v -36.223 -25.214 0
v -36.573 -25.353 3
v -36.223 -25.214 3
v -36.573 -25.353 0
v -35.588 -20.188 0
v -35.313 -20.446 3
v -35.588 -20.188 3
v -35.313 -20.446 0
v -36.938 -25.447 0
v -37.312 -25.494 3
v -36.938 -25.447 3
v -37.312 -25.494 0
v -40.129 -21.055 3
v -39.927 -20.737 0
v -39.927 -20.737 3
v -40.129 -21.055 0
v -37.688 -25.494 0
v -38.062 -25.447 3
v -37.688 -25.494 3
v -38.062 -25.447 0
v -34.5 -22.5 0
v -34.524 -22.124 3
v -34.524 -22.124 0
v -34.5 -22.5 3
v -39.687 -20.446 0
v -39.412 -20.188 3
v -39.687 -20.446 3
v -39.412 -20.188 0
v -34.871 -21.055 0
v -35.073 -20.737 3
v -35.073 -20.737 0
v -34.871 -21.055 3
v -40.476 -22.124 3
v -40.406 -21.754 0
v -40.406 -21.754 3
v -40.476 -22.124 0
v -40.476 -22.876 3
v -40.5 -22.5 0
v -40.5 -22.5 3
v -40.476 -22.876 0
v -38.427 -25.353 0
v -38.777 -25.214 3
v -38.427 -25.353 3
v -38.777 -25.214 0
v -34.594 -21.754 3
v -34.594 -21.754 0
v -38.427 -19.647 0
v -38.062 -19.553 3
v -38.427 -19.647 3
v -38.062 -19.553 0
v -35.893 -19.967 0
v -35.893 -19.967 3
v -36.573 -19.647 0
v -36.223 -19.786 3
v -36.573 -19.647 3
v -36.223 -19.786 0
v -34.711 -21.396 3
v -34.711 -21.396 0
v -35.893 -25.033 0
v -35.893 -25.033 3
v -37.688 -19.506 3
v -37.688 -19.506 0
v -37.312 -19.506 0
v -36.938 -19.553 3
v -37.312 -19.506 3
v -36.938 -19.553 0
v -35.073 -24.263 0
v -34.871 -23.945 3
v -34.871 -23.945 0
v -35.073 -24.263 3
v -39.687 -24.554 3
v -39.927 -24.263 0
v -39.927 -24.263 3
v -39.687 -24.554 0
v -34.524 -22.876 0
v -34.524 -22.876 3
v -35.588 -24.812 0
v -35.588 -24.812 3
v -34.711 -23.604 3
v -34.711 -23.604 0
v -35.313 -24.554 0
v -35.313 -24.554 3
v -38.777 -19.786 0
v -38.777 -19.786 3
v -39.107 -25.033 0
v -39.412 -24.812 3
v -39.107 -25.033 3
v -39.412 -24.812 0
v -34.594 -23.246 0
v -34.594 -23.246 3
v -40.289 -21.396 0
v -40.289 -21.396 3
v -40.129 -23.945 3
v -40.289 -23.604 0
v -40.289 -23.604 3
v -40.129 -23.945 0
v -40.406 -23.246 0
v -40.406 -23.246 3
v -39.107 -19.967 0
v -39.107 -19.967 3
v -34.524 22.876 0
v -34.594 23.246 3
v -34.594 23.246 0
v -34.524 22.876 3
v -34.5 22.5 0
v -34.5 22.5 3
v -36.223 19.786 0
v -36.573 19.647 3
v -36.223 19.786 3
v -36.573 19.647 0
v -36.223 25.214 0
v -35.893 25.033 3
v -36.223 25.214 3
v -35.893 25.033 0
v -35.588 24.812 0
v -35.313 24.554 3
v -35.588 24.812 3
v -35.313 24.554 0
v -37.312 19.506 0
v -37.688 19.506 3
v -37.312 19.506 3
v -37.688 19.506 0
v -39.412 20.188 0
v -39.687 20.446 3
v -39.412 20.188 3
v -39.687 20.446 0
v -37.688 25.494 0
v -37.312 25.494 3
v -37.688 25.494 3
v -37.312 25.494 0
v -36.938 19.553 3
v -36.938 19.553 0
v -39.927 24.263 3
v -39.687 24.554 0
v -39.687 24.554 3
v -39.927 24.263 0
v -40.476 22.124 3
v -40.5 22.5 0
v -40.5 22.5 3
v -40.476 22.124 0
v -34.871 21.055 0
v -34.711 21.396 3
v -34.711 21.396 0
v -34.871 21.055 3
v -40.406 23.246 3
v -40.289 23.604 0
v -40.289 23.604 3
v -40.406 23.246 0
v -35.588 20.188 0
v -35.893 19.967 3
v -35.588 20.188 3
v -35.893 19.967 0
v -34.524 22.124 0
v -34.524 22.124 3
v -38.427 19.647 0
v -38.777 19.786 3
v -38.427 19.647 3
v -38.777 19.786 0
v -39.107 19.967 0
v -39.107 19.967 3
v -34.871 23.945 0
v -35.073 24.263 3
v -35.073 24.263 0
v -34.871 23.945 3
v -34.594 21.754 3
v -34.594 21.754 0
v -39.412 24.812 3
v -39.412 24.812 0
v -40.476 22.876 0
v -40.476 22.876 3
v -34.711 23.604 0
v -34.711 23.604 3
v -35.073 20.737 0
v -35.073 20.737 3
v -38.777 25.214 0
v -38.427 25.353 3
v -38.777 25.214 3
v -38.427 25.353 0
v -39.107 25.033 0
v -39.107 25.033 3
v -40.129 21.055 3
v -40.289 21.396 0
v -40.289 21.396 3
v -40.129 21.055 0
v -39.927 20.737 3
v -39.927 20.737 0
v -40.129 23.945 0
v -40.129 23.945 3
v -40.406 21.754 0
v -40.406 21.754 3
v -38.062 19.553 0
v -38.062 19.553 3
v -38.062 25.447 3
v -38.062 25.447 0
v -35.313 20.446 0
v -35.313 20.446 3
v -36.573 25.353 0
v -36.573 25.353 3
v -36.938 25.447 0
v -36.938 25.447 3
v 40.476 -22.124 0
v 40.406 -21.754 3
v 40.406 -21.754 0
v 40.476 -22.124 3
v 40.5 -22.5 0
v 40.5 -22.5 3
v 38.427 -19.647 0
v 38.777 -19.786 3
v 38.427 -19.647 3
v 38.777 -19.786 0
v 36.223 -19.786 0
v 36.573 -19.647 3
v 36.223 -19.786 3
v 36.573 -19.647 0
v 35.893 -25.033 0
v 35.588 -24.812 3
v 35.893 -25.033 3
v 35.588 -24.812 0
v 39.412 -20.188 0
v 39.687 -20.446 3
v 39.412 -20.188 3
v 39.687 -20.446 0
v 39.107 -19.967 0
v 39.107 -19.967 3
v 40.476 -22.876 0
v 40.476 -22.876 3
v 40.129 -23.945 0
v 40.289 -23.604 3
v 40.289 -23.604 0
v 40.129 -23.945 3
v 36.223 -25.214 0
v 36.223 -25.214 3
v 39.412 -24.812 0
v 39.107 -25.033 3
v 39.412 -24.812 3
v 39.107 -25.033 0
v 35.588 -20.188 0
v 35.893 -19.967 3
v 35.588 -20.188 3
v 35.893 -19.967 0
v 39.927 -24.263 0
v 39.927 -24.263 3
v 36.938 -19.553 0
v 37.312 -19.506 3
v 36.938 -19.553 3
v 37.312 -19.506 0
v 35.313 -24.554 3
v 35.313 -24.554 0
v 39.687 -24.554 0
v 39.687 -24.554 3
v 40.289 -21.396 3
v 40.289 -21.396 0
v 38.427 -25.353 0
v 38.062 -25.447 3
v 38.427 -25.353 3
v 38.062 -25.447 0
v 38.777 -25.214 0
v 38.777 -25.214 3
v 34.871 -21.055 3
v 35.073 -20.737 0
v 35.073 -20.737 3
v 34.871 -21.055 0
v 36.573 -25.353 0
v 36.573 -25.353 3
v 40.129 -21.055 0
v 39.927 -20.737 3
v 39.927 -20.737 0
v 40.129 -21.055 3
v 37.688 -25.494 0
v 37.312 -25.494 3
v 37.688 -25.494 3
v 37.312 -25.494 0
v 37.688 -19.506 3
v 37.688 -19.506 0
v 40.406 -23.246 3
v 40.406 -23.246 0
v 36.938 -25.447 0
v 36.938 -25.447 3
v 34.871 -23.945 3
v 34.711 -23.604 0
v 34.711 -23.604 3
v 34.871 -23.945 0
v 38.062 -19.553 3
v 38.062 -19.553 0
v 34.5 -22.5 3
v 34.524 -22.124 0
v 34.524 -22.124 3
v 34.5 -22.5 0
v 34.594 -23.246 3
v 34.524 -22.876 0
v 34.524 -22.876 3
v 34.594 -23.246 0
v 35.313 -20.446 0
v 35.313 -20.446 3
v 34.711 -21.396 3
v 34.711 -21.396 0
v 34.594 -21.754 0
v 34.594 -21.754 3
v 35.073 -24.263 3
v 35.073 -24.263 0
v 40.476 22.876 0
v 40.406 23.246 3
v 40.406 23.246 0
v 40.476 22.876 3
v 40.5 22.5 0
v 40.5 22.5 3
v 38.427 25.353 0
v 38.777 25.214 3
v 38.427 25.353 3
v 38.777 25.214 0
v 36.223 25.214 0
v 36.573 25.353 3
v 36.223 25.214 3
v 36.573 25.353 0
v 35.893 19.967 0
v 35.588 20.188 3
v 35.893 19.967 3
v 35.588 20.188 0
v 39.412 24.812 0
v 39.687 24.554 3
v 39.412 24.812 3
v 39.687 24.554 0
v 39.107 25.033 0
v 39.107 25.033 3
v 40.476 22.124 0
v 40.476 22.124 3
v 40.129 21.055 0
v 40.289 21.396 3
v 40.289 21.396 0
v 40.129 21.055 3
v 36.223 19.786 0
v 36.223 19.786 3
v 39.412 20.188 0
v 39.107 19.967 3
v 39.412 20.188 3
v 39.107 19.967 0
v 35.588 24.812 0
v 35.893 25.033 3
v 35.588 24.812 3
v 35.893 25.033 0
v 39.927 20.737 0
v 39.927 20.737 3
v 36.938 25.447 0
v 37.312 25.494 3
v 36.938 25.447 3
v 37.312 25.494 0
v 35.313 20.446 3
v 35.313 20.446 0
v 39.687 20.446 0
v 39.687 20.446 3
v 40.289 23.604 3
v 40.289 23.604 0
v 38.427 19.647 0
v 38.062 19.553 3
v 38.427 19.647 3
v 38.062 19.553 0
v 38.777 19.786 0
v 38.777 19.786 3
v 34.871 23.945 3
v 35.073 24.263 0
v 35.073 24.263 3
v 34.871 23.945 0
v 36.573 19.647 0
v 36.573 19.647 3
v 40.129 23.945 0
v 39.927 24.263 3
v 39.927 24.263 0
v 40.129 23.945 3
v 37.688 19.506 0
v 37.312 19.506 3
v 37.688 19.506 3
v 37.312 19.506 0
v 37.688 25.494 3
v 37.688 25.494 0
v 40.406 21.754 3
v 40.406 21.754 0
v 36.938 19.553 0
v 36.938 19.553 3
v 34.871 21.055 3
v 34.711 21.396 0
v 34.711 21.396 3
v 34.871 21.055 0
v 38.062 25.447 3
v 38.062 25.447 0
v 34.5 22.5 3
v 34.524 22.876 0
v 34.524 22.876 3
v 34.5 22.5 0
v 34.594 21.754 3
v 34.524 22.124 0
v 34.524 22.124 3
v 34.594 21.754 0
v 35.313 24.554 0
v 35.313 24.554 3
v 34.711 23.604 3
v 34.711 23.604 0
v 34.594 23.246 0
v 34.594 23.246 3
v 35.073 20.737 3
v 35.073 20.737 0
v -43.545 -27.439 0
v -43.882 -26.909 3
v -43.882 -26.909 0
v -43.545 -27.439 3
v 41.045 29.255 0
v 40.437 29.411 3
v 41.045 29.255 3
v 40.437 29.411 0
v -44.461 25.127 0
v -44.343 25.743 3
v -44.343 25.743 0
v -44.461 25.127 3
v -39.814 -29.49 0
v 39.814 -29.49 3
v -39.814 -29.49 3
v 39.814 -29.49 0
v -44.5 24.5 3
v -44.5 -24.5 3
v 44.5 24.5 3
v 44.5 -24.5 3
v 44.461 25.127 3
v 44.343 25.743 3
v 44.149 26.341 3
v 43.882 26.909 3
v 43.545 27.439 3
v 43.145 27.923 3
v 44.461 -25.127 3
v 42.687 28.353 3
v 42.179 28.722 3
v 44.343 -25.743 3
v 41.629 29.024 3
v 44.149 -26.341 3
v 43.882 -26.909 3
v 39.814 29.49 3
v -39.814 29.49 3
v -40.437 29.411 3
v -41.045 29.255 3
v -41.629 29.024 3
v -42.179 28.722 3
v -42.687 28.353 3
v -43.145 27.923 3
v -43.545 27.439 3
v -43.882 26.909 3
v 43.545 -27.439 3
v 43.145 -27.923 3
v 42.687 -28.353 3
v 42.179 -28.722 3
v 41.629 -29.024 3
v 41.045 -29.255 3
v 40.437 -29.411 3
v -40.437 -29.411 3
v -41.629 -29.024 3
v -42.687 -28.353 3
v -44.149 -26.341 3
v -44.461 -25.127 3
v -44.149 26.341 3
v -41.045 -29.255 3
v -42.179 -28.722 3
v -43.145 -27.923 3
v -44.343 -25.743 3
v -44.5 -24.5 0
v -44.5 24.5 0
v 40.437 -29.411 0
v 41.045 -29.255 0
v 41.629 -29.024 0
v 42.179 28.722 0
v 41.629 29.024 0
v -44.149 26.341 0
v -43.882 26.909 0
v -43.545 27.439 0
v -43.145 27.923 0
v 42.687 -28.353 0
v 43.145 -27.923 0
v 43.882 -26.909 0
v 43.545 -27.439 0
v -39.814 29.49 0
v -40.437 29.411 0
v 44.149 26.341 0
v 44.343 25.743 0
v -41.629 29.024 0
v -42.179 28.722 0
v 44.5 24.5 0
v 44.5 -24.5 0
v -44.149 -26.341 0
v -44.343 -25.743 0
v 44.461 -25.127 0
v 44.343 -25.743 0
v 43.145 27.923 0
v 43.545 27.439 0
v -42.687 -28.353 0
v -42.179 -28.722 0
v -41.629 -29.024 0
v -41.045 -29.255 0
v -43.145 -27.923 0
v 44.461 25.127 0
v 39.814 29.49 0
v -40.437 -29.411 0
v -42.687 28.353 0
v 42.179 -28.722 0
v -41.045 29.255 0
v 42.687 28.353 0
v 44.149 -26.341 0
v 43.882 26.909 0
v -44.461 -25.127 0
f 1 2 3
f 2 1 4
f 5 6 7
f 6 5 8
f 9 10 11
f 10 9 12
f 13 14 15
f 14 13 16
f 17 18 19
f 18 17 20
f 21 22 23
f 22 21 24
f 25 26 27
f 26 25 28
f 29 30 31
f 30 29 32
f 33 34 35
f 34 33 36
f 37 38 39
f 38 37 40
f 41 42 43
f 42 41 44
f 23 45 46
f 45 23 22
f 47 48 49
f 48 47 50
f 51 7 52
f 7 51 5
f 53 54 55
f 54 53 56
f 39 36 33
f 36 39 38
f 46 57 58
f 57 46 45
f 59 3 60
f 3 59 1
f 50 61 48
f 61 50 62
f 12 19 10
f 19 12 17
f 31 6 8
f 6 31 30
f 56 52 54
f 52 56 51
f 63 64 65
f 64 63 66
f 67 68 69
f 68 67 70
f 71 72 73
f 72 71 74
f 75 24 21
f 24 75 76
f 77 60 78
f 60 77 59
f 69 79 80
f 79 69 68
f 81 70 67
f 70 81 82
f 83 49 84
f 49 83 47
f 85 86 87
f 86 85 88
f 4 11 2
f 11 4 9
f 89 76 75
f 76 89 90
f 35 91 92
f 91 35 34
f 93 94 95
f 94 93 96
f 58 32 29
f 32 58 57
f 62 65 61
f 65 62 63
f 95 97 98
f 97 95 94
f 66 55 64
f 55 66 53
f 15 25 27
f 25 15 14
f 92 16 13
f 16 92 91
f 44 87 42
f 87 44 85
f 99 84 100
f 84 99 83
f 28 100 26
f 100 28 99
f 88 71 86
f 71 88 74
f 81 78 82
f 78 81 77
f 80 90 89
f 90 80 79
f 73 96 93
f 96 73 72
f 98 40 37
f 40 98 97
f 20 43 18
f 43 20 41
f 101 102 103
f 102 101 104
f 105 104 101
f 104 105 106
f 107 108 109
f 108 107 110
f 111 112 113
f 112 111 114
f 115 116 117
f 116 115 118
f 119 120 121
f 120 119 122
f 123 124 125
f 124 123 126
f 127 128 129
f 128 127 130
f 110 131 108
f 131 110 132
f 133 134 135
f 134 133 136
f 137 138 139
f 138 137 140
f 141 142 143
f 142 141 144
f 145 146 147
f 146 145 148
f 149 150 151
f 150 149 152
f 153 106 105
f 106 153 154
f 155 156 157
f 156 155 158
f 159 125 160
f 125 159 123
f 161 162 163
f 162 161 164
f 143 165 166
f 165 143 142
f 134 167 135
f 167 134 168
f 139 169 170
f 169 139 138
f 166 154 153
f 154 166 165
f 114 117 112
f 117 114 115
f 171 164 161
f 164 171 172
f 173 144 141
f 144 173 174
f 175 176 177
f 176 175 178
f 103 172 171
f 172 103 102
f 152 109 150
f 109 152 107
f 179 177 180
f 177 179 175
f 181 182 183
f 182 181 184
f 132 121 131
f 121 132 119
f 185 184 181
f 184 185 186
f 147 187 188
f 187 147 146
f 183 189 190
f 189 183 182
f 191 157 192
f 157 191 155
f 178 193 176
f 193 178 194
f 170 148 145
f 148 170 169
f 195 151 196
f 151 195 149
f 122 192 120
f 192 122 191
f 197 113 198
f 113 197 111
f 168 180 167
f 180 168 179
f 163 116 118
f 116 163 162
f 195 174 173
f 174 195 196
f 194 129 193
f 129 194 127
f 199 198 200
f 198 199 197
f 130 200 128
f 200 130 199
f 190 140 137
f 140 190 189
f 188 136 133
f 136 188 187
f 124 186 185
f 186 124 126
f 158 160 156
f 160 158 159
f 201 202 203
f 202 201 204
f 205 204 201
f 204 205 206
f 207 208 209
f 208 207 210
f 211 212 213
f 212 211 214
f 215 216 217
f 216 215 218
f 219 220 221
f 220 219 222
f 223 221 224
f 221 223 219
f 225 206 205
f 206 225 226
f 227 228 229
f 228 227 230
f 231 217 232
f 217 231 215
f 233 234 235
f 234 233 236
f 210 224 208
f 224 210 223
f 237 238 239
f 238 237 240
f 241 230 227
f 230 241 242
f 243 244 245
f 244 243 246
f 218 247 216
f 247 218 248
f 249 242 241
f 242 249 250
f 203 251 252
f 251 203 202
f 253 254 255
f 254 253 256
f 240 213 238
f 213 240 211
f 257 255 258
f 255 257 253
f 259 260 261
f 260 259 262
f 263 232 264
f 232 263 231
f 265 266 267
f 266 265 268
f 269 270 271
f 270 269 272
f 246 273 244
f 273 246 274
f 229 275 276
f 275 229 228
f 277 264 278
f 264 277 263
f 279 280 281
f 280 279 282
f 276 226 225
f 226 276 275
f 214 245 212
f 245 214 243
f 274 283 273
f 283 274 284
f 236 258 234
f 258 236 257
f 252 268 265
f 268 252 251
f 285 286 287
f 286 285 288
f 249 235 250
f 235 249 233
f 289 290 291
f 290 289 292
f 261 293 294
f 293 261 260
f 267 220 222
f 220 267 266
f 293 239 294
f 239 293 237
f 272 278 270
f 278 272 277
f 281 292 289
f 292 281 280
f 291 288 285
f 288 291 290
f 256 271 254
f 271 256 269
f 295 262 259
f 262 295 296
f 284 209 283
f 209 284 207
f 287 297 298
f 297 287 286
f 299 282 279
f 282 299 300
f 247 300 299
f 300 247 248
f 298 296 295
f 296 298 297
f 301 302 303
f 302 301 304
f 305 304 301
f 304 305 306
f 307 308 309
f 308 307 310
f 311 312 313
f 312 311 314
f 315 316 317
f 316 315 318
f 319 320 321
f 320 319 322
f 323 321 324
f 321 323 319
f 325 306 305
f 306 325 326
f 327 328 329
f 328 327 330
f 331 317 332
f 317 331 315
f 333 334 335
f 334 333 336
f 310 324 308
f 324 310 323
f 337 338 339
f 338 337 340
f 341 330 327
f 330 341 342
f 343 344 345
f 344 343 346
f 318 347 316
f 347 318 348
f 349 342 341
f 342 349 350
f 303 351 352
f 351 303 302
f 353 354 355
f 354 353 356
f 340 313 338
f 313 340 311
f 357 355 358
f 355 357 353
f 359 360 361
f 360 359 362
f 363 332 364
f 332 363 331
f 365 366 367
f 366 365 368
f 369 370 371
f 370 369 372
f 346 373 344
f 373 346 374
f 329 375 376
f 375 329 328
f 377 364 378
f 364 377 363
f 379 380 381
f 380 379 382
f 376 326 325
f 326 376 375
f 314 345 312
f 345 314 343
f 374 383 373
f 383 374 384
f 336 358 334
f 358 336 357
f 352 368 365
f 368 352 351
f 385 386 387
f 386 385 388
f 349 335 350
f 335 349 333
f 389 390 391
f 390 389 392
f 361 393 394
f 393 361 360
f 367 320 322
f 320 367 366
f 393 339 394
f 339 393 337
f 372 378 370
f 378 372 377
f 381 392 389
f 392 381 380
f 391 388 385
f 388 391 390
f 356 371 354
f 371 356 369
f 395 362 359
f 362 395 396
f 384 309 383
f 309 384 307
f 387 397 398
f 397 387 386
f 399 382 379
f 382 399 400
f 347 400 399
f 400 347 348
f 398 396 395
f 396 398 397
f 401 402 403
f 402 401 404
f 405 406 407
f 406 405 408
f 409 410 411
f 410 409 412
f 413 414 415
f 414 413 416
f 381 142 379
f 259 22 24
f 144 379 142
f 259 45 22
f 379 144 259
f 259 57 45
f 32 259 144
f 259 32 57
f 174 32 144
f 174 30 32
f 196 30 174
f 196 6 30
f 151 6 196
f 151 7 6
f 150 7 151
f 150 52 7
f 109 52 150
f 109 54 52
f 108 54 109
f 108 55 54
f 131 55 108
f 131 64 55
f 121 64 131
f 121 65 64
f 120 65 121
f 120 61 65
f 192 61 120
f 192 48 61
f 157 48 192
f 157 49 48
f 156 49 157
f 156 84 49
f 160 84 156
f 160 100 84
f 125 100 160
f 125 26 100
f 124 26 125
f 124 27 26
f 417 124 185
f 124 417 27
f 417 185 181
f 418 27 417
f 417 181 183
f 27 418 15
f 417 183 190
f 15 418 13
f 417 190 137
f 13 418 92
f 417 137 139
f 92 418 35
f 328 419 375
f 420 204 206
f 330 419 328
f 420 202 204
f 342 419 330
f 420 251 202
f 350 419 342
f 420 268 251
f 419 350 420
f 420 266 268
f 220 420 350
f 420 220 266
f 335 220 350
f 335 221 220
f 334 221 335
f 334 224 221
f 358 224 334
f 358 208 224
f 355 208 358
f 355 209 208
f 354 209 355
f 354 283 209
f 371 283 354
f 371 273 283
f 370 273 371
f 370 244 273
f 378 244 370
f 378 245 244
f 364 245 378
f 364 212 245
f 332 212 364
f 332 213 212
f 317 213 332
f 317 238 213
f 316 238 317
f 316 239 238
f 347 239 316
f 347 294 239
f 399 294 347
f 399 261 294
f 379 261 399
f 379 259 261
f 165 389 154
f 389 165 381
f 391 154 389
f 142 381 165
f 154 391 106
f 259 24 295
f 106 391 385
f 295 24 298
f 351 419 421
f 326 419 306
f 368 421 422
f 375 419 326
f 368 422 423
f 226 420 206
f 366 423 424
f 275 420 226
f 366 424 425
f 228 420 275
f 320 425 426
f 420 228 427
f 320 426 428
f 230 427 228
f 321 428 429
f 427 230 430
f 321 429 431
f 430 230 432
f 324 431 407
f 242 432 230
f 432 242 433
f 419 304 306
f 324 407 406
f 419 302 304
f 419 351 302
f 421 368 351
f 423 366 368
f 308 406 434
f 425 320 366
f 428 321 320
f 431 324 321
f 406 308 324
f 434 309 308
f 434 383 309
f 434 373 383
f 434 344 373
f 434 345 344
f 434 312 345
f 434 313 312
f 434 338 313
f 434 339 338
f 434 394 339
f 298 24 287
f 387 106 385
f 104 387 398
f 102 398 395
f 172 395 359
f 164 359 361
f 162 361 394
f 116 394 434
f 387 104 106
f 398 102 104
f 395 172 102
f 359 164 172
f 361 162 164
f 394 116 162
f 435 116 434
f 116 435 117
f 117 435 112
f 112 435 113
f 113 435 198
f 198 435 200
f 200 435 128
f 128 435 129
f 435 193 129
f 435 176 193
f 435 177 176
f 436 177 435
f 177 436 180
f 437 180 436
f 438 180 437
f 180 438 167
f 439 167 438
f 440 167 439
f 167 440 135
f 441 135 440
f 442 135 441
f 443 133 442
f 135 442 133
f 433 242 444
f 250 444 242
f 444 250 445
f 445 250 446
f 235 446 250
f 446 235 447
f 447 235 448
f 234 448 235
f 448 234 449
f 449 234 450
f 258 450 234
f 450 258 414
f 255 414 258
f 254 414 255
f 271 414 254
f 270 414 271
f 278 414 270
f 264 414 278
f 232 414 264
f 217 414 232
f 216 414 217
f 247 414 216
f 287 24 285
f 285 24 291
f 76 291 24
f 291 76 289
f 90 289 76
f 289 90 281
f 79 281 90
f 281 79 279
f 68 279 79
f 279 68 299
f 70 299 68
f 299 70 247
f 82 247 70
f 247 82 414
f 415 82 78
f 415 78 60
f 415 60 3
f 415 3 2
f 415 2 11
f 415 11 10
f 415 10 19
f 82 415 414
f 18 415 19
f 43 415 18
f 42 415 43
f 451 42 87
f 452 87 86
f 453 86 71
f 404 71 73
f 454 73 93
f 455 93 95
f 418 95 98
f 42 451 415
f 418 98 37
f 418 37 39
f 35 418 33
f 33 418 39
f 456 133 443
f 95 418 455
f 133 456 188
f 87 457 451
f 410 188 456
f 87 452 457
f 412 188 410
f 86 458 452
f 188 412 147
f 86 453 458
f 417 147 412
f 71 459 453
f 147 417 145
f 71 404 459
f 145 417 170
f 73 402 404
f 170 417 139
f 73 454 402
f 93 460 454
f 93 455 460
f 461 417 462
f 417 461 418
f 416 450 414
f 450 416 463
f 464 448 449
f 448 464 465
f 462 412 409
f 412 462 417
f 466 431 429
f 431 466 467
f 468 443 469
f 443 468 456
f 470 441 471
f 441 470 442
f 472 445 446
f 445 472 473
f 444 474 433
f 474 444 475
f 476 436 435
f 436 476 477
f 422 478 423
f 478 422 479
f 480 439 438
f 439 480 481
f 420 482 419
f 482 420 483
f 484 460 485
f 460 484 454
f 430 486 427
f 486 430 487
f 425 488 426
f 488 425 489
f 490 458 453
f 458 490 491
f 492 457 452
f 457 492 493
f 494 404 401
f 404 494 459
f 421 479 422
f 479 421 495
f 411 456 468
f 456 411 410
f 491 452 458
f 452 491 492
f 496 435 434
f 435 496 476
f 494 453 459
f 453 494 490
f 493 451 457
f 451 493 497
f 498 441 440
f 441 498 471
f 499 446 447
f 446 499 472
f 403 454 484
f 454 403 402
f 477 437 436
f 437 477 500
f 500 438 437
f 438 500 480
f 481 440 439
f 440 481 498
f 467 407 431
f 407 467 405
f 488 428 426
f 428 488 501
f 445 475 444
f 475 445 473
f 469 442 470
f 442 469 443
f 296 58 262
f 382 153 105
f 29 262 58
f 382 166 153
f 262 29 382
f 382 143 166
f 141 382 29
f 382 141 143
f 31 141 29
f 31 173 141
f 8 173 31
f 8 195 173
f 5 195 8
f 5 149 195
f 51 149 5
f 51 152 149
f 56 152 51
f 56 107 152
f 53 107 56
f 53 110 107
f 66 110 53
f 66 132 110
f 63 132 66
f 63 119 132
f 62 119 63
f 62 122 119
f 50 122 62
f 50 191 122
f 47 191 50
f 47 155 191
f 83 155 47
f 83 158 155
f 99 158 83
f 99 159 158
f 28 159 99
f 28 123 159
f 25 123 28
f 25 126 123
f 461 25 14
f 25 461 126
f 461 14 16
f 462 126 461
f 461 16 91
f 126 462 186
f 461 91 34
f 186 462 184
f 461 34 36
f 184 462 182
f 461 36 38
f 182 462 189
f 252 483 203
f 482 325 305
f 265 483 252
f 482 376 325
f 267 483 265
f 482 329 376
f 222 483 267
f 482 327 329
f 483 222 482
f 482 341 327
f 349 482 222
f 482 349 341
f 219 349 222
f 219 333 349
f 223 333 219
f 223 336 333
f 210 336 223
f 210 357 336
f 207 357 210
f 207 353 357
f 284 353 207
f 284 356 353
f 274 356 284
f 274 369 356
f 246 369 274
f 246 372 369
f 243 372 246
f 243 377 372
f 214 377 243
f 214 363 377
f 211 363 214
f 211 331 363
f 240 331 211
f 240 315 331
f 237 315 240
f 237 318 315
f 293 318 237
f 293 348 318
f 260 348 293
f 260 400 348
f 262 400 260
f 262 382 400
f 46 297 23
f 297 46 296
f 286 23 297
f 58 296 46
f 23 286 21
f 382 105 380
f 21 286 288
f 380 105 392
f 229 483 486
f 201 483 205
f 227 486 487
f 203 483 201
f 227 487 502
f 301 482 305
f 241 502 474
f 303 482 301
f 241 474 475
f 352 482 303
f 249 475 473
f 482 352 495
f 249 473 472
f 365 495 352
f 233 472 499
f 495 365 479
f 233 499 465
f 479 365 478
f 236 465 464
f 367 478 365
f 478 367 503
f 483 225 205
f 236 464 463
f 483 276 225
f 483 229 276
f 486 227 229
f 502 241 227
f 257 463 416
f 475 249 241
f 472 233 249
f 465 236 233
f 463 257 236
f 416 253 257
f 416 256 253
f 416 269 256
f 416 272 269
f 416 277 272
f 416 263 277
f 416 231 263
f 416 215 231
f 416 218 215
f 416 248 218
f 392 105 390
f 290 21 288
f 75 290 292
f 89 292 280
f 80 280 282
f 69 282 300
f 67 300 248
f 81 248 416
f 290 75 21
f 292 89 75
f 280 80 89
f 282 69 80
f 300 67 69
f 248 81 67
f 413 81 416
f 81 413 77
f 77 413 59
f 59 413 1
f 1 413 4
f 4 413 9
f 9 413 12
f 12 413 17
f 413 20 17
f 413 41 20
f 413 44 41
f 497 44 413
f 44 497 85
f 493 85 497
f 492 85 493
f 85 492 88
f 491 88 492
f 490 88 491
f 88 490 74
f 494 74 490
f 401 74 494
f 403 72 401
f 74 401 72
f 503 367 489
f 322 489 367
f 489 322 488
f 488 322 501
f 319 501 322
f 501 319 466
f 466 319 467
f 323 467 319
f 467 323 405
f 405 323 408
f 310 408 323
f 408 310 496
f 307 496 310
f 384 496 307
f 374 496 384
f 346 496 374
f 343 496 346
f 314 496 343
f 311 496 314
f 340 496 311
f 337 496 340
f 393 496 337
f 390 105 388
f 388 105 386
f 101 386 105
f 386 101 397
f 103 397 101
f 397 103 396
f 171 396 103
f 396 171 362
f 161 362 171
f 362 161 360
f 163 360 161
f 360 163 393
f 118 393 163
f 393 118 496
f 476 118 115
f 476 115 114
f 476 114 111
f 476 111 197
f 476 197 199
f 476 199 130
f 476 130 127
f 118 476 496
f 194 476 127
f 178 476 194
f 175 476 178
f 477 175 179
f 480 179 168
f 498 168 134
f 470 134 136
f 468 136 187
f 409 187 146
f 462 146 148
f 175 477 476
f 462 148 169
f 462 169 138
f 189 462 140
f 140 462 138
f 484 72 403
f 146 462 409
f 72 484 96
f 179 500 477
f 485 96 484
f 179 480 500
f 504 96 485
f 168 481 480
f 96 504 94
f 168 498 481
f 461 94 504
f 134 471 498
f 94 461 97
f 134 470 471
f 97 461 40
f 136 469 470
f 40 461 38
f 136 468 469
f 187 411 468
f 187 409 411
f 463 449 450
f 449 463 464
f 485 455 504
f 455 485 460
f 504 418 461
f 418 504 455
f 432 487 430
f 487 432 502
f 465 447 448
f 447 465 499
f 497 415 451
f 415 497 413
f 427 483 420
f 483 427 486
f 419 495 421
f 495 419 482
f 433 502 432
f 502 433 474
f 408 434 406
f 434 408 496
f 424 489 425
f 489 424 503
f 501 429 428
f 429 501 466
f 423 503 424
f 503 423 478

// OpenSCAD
$fn = 50;


difference() {
	union() {
		hull() {
			translate(v = [-39.5000000000, 24.5000000000, 0]) {
				cylinder(h = 3, r = 5);
			}
			translate(v = [39.5000000000, 24.5000000000, 0]) {
				cylinder(h = 3, r = 5);
			}
			translate(v = [-39.5000000000, -24.5000000000, 0]) {
				cylinder(h = 3, r = 5);
			}
			translate(v = [39.5000000000, -24.5000000000, 0]) {
				cylinder(h = 3, r = 5);
			}
		}
	}
	union() {
		translate(v = [-37.5000000000, -22.5000000000, -100.0000000000]) {
			cylinder(h = 200, r = 3.0000000000);
		}
		translate(v = [-37.5000000000, 22.5000000000, -100.0000000000]) {
			cylinder(h = 200, r = 3.0000000000);
		}
		translate(v = [37.5000000000, -22.5000000000, -100.0000000000]) {
			cylinder(h = 200, r = 3.0000000000);
		}
		translate(v = [37.5000000000, 22.5000000000, -100.0000000000]) {
			cylinder(h = 200, r = 3.0000000000);
		}
	}
}
